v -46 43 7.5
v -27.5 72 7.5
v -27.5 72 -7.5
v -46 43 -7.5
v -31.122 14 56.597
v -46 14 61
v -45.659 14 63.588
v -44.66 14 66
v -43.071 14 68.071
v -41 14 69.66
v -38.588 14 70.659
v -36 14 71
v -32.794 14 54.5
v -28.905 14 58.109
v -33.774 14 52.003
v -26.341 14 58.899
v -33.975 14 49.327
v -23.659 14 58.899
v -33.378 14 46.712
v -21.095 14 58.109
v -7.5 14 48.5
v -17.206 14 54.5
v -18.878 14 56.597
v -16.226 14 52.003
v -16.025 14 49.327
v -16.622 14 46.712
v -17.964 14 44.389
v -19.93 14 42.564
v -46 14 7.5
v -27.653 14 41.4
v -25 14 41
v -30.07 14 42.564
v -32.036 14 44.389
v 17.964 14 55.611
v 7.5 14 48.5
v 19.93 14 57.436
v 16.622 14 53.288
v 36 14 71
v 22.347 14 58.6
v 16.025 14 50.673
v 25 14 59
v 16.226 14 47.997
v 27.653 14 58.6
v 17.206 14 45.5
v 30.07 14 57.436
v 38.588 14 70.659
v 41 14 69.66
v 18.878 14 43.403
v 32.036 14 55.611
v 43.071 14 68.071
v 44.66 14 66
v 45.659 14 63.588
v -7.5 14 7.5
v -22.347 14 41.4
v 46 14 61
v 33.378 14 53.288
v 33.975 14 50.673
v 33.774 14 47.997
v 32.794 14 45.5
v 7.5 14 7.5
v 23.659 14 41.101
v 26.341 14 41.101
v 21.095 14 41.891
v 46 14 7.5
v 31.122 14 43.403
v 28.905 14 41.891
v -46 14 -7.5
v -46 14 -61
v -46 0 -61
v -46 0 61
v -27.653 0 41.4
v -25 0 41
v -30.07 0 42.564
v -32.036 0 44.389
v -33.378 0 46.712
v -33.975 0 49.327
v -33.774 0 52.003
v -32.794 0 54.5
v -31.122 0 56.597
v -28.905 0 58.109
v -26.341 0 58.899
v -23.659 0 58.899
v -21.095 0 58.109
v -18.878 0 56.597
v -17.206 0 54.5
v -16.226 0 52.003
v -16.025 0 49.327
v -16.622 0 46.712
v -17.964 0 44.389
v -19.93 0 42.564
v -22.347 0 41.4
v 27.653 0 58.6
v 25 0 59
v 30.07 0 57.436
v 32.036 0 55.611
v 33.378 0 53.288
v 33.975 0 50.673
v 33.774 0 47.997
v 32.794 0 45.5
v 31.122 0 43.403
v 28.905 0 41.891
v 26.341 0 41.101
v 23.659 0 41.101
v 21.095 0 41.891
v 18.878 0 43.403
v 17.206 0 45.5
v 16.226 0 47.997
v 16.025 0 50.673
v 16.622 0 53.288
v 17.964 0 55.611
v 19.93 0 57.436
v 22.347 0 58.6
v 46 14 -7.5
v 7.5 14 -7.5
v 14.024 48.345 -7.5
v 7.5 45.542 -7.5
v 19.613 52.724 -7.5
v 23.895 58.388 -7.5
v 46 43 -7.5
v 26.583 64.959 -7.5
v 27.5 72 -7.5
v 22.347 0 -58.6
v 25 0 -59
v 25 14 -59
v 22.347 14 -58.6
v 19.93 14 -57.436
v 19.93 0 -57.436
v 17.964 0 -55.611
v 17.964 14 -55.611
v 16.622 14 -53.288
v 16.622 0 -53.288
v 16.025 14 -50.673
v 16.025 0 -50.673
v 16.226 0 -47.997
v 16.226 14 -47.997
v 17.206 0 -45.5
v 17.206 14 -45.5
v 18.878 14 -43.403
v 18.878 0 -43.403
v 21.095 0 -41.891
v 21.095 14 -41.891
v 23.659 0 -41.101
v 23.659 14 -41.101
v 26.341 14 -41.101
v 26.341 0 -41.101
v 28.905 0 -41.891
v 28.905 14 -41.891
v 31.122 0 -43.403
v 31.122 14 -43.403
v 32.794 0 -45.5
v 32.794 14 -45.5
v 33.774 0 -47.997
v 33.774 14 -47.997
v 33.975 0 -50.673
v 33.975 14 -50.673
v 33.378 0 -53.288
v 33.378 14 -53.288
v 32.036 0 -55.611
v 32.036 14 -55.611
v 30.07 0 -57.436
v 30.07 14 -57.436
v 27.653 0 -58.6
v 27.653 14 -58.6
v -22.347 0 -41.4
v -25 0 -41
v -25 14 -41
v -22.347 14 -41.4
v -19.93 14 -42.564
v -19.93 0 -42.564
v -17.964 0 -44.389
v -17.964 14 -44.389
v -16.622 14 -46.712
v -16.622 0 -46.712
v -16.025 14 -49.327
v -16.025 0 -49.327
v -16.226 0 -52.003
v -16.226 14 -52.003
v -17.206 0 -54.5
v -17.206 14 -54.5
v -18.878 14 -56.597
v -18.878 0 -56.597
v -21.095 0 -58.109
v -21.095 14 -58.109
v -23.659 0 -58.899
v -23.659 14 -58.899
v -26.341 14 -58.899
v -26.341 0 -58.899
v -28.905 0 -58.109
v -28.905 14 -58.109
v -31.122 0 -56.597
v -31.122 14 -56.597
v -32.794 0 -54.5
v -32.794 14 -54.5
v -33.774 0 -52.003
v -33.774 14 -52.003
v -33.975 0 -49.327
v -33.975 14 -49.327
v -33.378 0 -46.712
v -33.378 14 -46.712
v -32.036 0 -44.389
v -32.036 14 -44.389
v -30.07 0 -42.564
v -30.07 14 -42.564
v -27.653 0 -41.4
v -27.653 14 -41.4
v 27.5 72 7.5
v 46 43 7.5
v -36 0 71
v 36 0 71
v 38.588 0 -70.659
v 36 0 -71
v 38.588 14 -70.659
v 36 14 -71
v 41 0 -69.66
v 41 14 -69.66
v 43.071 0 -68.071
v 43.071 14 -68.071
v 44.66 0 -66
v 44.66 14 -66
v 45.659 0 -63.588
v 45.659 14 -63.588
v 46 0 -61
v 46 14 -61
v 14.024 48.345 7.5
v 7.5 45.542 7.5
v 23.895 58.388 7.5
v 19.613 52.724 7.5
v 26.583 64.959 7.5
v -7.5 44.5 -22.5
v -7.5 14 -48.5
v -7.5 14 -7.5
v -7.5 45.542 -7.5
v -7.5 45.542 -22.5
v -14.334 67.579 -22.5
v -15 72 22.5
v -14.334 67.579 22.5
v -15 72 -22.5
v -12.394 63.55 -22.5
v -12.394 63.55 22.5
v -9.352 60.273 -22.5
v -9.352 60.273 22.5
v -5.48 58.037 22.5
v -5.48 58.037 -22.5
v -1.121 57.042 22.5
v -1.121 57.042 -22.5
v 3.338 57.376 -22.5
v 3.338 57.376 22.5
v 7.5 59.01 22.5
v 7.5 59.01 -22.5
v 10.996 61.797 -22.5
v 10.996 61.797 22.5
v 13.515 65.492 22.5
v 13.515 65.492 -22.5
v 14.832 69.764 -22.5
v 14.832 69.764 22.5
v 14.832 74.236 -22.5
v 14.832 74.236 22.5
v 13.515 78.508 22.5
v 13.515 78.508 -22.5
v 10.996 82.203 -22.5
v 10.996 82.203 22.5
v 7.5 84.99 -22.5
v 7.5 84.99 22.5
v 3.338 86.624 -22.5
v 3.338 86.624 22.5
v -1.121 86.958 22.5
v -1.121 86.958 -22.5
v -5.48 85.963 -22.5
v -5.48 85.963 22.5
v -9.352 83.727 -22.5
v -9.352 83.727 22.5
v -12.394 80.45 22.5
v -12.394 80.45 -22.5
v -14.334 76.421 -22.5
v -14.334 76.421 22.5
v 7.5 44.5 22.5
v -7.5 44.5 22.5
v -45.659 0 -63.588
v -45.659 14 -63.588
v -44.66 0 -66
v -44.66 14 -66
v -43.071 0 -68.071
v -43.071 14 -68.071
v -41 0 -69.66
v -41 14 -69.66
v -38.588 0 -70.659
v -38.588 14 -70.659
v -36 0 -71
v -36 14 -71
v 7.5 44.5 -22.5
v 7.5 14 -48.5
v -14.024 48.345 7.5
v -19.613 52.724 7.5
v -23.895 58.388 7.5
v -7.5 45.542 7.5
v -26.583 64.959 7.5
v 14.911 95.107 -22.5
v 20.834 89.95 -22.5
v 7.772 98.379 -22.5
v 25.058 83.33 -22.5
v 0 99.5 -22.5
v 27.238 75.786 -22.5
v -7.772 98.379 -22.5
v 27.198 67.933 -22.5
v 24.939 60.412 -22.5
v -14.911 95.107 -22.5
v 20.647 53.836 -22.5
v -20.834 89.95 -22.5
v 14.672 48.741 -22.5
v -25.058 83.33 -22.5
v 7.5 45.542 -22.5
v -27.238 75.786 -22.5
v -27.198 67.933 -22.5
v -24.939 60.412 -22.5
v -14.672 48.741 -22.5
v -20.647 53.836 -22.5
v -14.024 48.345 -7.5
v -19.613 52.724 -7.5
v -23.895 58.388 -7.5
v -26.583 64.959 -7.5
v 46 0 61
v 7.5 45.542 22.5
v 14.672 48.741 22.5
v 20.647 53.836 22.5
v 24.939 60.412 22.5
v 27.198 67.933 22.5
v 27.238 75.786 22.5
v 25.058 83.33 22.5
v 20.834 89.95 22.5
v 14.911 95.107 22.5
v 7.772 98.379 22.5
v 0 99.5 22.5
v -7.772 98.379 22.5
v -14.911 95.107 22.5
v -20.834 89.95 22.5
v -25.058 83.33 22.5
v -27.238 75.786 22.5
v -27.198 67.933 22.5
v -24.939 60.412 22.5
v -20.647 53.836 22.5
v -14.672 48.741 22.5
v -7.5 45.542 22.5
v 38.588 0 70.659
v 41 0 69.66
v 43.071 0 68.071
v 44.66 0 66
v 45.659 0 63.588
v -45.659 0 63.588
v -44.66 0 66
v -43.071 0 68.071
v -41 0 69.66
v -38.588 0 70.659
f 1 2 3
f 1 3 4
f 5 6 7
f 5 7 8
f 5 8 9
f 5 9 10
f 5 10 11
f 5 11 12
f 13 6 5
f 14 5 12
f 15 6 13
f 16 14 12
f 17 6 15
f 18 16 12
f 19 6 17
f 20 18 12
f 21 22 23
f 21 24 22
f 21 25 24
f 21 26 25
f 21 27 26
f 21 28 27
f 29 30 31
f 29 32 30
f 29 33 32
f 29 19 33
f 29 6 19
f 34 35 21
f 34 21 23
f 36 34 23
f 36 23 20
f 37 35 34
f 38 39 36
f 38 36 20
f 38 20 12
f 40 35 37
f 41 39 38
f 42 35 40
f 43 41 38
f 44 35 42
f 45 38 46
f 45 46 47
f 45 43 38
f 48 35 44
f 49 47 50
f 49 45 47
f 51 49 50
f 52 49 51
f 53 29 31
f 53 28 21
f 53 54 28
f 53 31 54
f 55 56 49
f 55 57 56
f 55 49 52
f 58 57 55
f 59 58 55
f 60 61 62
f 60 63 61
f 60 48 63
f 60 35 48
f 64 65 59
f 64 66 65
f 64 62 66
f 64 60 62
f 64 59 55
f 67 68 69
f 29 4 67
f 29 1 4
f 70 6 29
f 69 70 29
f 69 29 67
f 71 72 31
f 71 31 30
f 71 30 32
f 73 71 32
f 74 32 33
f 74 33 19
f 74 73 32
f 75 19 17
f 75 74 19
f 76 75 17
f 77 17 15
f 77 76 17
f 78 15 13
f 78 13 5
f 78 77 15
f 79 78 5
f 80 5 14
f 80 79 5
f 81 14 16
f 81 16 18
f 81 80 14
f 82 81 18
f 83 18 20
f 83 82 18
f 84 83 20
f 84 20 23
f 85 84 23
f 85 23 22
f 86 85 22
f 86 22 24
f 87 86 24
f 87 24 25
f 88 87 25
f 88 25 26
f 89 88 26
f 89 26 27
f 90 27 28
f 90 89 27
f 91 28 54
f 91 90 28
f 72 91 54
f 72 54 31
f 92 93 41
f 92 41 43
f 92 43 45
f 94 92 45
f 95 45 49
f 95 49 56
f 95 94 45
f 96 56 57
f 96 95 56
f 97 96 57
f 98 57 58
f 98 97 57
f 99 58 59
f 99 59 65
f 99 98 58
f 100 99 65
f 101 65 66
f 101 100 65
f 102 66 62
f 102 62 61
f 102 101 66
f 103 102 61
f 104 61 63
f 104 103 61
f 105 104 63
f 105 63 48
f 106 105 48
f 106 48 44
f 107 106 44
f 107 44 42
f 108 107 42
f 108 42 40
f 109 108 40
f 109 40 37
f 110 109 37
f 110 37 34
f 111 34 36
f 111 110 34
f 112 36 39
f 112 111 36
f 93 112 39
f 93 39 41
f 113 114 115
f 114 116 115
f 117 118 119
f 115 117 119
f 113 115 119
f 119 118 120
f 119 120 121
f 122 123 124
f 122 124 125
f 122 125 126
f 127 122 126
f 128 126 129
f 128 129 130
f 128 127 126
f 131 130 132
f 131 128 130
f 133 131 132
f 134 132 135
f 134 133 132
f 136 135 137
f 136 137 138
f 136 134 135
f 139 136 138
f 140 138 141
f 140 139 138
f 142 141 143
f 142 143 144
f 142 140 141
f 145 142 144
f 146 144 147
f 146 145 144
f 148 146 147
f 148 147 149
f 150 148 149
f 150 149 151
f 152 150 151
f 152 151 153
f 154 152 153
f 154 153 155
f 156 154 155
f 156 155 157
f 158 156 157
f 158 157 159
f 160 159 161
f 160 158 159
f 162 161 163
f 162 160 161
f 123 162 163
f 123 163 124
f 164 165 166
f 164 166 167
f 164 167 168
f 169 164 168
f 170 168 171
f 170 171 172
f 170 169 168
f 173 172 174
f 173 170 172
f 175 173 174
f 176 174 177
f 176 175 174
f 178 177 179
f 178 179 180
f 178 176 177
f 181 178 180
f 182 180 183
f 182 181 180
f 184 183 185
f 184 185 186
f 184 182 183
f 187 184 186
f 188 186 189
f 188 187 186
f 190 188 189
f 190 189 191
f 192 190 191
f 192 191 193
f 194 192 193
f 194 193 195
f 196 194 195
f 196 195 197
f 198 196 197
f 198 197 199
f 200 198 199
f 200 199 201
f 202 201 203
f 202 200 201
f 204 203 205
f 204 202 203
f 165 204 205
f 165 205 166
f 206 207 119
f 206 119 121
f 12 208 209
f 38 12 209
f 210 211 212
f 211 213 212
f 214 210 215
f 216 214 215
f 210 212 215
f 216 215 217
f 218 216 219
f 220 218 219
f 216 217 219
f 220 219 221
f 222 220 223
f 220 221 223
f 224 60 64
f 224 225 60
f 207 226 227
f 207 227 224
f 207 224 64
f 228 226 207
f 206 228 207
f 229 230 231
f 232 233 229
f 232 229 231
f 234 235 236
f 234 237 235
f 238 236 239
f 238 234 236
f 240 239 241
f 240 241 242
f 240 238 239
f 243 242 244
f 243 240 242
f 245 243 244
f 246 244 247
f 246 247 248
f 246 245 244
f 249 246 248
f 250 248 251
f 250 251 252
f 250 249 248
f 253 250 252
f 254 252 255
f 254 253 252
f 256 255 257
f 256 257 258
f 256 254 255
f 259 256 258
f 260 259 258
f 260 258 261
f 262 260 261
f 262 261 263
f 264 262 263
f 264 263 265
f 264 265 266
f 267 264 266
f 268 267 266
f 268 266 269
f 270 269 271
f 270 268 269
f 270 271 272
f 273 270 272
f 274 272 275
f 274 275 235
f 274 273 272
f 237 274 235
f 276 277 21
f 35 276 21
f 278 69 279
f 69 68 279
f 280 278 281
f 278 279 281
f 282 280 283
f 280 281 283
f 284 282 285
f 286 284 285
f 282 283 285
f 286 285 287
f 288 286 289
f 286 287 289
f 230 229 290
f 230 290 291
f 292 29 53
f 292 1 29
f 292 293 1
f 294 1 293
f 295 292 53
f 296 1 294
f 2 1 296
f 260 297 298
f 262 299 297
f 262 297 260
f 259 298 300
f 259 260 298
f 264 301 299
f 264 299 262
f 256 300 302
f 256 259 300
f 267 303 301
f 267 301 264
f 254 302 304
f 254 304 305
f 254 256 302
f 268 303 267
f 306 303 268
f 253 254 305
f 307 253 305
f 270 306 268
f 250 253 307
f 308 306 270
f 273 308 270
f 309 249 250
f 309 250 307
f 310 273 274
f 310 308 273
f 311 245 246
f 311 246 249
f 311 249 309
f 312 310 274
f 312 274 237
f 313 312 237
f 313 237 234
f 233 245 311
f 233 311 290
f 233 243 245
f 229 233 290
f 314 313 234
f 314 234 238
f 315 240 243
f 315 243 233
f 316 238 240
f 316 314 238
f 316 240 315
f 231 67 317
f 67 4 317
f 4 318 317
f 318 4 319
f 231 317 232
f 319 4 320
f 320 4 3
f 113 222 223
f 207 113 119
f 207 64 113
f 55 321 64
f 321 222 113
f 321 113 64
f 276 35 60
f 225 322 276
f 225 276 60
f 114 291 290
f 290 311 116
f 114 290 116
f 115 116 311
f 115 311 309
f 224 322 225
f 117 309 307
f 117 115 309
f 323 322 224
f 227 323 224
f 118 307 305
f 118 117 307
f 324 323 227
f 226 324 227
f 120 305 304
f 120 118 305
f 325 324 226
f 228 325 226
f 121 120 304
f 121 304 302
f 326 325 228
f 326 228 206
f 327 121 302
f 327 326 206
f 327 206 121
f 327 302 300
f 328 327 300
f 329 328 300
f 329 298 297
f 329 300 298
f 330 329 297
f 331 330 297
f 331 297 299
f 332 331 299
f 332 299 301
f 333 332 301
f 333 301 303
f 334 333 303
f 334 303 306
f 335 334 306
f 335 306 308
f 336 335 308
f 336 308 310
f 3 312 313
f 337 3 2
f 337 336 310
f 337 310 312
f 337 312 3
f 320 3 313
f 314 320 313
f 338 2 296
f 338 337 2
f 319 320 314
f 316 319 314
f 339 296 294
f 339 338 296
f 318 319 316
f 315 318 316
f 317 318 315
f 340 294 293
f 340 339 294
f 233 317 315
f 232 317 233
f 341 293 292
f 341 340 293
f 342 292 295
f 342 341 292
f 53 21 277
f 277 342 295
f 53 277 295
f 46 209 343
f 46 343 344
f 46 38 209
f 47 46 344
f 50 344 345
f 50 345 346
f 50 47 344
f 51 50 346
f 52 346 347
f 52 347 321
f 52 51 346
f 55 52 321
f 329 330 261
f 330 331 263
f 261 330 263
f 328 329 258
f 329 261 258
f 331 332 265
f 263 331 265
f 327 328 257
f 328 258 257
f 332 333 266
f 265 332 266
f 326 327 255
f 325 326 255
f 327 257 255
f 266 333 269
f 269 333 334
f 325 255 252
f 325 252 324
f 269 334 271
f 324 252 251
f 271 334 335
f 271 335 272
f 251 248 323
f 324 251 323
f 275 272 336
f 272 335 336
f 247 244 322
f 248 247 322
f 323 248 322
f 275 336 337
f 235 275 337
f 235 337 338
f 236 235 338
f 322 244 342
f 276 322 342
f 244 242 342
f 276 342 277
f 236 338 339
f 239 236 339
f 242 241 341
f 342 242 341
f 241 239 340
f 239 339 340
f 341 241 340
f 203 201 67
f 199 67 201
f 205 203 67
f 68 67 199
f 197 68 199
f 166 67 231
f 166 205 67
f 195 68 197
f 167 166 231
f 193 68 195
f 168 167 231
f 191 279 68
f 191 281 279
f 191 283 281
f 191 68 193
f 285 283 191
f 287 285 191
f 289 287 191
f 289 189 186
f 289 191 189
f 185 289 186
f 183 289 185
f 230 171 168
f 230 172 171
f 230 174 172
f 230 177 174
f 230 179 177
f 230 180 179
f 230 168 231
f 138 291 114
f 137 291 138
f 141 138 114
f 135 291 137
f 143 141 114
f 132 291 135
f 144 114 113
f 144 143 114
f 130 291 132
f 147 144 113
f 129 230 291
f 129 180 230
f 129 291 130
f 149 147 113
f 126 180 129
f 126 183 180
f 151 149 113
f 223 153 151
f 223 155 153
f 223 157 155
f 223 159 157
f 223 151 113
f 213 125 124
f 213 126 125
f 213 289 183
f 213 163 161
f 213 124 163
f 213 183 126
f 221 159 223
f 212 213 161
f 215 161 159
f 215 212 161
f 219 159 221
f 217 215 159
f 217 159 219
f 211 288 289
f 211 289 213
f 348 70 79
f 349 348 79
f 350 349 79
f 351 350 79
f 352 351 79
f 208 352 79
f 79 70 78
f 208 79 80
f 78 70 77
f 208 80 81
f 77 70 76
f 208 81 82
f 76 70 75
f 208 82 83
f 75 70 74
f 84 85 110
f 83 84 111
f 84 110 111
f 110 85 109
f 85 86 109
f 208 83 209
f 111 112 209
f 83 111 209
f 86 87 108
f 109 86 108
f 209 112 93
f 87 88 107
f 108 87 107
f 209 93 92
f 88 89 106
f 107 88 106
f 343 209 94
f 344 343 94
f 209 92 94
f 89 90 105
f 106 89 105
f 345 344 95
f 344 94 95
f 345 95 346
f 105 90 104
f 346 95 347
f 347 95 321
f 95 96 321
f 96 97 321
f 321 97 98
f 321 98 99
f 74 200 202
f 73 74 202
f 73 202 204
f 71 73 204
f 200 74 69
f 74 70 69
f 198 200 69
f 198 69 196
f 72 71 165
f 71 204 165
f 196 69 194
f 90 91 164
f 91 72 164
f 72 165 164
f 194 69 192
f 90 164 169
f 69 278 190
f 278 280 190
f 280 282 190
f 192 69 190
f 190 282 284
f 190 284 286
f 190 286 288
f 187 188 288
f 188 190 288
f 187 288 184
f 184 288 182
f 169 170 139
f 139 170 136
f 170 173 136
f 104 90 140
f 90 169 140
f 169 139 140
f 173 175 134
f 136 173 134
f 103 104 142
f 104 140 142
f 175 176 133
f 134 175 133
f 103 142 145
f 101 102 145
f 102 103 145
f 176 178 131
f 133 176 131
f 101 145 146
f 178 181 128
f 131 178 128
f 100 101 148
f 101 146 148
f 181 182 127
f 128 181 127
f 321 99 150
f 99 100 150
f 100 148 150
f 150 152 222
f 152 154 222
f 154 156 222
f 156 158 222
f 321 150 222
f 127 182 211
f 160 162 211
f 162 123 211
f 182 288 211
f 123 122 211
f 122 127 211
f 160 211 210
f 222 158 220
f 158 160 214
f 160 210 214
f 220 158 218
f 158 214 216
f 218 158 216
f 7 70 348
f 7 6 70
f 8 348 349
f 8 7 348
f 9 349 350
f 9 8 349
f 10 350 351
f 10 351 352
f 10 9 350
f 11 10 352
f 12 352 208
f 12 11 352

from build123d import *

# Parameters (mm, degrees)
ESQUISSE1_W        = 92
ESQUISSE1_H        = 142
ESQUISSE1_R        = 9
BOSS_EXTRU_1_DEPTH = 14
CONG_1_R           = 10
ESQUISSE2_R        = 27.5
ESQUISSE2_R_2      = 15
BOSS_EXTRU_2_DEPTH = 22.5
BOSS_EXTRU_3_DEPTH = 7.5
NERVURE1_START     = -7.5
NERVURE1_DEPTH     = 15


with BuildPart() as part:
    # Esquisse1 → Boss.-Extru.1 (new body)
    with BuildSketch(Plane(origin=(0, 0, 0), x_dir=(1, 0, 0), z_dir=(0, 1, 0))):
        Rectangle(ESQUISSE1_W, ESQUISSE1_H)
        with Locations(Location((25, -50, 0), (0, 0, 270))):
            Circle(ESQUISSE1_R, mode=Mode.SUBTRACT)
        with Locations(Location((25, 50, 0), (0, 0, 90))):
            Circle(ESQUISSE1_R, mode=Mode.SUBTRACT)
        with Locations(Location((-25, -50, 0), (0, 0, 90))):
            Circle(ESQUISSE1_R, mode=Mode.SUBTRACT)
        with Locations(Location((-25, 50, 0), (0, 0, 270))):
            Circle(ESQUISSE1_R, mode=Mode.SUBTRACT)
    extrude(amount=BOSS_EXTRU_1_DEPTH)

    # Congé1
    cong_1_edges = [part.edges().sort_by_distance(p)[0] for p in [
        (46, 7, 71),
        (-46, 7, 71),
        (-46, 7, -71),
        (46, 7, -71),
    ]]
    fillet(cong_1_edges, radius=CONG_1_R)



with BuildPart() as body_2:
    # Esquisse2 → Boss.-Extru.2 (new, symmetric)
    with BuildSketch(Plane.XY):
        with Locations(Location((0, 72, 0), (0, 0, 180))):
            Circle(ESQUISSE2_R)
        with Locations(Location((0, 72, 0), (0, 0, 180))):
            Circle(ESQUISSE2_R_2, mode=Mode.SUBTRACT)
    extrude(amount=BOSS_EXTRU_2_DEPTH, both=True)


with BuildPart() as part_1:
    add(part.part)

    add(body_2.part)  # Boss.-Extru.3 merges body 2
    # Esquisse3 → Boss.-Extru.3 (add, symmetric)
    with BuildSketch(Plane.XY):
        with BuildLine():
            Line((46, 14), (46, 43))
            Line((46, 43), (27.5, 72))
            ThreePointArc((27.5, 72), (0, 44.5), (-27.5, 72))
            Line((-27.5, 72), (-46, 43))
            Line((-46, 43), (-46, 14))
            Line((-46, 14), (46, 14))
        make_face()
    extrude(amount=BOSS_EXTRU_3_DEPTH, both=True)

    # Nervure1: read off the stored shape, not the designer's step
    # Nervure1 outline → Nervure1 (add)
    with BuildSketch(Plane(origin=(0, 0, 0), x_dir=(0, 0, -1), z_dir=(1, 0, 0)).offset(NERVURE1_START)):
        Polygon((-22.5, 44.5), (-48.5, 14), (-7.5, 14), (-7.5, 45.542486889), (-22.5, 45.542486889), align=None)
    nervure1 = extrude(amount=NERVURE1_DEPTH)

    # Symétrie1: Nervure1 across plane
    add(nervure1.mirror(Plane.XY))


solid = part_1.part
